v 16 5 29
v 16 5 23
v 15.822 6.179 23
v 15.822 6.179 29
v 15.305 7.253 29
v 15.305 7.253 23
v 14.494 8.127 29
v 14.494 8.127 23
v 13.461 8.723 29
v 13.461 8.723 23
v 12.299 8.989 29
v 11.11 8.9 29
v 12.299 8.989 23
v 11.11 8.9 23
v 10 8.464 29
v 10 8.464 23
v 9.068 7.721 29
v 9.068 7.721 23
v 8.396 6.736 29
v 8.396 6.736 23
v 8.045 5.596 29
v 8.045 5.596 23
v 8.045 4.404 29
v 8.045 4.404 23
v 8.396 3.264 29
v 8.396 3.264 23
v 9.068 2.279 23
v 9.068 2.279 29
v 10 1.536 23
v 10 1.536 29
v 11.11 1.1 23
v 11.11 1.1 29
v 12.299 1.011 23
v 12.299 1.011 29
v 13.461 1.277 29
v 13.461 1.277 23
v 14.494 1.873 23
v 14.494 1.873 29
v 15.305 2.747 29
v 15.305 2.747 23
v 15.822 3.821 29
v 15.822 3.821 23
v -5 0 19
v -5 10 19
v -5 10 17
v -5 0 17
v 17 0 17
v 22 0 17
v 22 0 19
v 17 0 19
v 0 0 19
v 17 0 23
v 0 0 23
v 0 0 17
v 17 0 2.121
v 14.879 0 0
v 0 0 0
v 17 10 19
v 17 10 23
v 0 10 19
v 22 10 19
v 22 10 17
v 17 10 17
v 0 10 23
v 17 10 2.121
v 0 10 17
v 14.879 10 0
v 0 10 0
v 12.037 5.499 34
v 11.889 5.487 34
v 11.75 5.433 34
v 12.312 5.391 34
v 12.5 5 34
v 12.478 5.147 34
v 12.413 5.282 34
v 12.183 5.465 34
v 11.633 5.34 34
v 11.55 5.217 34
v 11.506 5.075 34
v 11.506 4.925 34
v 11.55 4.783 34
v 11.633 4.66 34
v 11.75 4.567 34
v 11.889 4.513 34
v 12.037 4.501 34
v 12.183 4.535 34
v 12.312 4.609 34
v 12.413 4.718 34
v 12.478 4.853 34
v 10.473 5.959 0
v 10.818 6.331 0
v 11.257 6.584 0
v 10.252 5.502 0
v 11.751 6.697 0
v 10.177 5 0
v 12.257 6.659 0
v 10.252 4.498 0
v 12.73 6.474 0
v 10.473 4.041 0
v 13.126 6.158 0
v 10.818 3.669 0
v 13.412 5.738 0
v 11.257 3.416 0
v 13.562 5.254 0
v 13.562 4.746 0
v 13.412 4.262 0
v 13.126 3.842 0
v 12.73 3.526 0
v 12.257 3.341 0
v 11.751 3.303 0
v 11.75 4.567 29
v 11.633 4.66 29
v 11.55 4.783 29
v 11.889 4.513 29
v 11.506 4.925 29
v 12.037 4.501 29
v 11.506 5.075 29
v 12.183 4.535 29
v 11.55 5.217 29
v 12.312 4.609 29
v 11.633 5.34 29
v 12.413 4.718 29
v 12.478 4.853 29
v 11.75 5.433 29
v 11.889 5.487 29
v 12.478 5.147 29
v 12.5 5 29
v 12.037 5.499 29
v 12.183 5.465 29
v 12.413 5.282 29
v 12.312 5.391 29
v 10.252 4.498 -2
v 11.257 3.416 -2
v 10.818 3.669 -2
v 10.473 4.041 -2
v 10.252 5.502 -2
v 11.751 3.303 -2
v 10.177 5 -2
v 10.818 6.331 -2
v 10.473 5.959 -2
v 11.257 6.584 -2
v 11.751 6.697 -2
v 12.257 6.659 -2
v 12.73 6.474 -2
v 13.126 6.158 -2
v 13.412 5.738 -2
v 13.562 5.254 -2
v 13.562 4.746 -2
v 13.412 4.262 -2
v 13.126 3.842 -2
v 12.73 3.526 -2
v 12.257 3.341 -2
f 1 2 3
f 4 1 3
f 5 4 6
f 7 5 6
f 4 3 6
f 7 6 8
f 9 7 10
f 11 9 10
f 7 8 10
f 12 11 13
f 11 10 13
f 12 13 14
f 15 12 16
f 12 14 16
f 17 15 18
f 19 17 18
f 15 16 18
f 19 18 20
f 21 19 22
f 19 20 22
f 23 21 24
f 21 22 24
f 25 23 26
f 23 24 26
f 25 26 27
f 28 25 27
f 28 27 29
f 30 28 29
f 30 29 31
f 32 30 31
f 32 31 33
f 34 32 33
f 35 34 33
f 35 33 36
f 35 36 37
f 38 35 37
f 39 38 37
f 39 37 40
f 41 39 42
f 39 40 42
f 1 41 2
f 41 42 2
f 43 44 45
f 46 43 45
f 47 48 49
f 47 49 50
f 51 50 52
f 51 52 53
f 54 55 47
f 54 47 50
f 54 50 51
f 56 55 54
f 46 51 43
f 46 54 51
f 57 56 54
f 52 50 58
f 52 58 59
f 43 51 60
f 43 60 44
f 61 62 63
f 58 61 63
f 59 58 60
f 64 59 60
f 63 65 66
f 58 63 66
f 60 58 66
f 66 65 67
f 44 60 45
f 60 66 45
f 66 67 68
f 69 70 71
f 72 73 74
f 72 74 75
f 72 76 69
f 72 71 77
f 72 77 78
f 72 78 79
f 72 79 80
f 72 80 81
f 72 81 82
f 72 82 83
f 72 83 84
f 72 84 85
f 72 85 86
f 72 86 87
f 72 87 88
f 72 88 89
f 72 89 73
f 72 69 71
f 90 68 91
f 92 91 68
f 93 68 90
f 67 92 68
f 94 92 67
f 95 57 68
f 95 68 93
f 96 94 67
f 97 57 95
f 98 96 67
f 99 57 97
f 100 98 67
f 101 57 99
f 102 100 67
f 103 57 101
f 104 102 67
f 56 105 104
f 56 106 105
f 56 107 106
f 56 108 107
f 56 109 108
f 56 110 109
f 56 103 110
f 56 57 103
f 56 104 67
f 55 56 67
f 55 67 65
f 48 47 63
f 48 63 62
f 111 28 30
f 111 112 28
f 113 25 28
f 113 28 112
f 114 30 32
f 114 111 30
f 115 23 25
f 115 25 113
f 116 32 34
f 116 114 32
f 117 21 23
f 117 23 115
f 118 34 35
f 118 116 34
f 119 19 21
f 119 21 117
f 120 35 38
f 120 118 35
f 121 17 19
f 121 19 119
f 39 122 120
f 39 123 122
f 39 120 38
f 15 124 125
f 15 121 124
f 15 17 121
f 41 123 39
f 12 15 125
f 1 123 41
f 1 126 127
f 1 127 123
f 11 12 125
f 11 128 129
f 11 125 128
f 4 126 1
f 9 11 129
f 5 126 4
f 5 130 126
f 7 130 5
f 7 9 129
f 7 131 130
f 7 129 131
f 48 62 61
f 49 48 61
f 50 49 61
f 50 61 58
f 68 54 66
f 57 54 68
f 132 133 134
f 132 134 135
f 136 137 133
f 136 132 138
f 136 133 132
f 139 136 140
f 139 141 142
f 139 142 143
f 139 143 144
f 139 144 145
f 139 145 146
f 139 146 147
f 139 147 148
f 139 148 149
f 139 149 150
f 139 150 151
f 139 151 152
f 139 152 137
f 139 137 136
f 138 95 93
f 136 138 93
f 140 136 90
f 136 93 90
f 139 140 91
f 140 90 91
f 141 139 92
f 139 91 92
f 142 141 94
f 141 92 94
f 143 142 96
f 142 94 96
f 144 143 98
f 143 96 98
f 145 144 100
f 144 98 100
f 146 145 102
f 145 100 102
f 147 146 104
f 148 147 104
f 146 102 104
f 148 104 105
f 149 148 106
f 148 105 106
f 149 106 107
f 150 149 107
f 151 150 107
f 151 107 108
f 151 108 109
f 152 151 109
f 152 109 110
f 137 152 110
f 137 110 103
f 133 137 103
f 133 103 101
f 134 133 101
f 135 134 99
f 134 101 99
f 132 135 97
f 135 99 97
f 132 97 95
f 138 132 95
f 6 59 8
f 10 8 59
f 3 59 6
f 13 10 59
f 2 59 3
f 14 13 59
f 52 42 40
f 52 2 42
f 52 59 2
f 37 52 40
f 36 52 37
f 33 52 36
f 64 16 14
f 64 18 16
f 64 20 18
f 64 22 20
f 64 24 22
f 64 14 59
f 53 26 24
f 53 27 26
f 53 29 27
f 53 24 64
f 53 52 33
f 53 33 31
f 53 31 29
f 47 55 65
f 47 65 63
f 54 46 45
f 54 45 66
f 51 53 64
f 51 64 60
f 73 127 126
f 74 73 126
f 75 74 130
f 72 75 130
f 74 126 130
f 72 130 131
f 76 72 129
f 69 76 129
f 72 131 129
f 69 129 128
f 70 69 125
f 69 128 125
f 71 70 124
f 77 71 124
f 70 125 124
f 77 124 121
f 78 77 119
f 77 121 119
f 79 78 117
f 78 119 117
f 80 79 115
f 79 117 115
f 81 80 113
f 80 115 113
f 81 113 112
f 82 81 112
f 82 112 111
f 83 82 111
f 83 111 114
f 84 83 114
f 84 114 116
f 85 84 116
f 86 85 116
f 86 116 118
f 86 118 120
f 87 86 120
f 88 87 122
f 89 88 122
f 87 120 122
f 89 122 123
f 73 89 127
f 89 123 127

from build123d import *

# Parameters (mm, degrees)
BOSS_EXTRUDE1_DEPTH = 10
SKETCH2_R           = 4
BOSS_EXTRUDE2_DEPTH = 6
SKETCH3_R           = 0.5
BOSS_EXTRUDE3_DEPTH = 5
SKETCH4_R           = 1.701881869
BOSS_EXTRUDE4_DEPTH = 2


with BuildPart() as part:
    # Sketch1 → Boss-Extrude1 (new body)
    with BuildSketch(Plane(origin=(0, 0, 0), x_dir=(1, 0, 0), z_dir=(0, 1, 0))):
        Polygon((0, 0), (14.878679656, 0), (17, -2.121320344), (17, -17), (22, -17), (22, -19), (17, -19), (17, -23), (0, -23), (0, -19), (-5, -19), (-5, -17), (0, -17), align=None)
    extrude(amount=BOSS_EXTRUDE1_DEPTH)

    # Sketch2 → Boss-Extrude2 (add)
    with BuildSketch(Plane.XY.offset(23)):
        with Locations((12, 5)):
            Circle(SKETCH2_R)
    extrude(amount=BOSS_EXTRUDE2_DEPTH)

    # Sketch3 → Boss-Extrude3 (add)
    with BuildSketch(Plane.XY.offset(29)):
        with Locations((12, 5)):
            Circle(SKETCH3_R)
    extrude(amount=BOSS_EXTRUDE3_DEPTH)

    # Sketch4 → Boss-Extrude4 (add)
    with BuildSketch(Plane(origin=(0, 0, 0), x_dir=(-1, 0, 0), z_dir=(0, 0, -1))):
        with Locations((-11.878679656, 5)):
            Circle(SKETCH4_R)
    extrude(amount=BOSS_EXTRUDE4_DEPTH)


solid = part.part
